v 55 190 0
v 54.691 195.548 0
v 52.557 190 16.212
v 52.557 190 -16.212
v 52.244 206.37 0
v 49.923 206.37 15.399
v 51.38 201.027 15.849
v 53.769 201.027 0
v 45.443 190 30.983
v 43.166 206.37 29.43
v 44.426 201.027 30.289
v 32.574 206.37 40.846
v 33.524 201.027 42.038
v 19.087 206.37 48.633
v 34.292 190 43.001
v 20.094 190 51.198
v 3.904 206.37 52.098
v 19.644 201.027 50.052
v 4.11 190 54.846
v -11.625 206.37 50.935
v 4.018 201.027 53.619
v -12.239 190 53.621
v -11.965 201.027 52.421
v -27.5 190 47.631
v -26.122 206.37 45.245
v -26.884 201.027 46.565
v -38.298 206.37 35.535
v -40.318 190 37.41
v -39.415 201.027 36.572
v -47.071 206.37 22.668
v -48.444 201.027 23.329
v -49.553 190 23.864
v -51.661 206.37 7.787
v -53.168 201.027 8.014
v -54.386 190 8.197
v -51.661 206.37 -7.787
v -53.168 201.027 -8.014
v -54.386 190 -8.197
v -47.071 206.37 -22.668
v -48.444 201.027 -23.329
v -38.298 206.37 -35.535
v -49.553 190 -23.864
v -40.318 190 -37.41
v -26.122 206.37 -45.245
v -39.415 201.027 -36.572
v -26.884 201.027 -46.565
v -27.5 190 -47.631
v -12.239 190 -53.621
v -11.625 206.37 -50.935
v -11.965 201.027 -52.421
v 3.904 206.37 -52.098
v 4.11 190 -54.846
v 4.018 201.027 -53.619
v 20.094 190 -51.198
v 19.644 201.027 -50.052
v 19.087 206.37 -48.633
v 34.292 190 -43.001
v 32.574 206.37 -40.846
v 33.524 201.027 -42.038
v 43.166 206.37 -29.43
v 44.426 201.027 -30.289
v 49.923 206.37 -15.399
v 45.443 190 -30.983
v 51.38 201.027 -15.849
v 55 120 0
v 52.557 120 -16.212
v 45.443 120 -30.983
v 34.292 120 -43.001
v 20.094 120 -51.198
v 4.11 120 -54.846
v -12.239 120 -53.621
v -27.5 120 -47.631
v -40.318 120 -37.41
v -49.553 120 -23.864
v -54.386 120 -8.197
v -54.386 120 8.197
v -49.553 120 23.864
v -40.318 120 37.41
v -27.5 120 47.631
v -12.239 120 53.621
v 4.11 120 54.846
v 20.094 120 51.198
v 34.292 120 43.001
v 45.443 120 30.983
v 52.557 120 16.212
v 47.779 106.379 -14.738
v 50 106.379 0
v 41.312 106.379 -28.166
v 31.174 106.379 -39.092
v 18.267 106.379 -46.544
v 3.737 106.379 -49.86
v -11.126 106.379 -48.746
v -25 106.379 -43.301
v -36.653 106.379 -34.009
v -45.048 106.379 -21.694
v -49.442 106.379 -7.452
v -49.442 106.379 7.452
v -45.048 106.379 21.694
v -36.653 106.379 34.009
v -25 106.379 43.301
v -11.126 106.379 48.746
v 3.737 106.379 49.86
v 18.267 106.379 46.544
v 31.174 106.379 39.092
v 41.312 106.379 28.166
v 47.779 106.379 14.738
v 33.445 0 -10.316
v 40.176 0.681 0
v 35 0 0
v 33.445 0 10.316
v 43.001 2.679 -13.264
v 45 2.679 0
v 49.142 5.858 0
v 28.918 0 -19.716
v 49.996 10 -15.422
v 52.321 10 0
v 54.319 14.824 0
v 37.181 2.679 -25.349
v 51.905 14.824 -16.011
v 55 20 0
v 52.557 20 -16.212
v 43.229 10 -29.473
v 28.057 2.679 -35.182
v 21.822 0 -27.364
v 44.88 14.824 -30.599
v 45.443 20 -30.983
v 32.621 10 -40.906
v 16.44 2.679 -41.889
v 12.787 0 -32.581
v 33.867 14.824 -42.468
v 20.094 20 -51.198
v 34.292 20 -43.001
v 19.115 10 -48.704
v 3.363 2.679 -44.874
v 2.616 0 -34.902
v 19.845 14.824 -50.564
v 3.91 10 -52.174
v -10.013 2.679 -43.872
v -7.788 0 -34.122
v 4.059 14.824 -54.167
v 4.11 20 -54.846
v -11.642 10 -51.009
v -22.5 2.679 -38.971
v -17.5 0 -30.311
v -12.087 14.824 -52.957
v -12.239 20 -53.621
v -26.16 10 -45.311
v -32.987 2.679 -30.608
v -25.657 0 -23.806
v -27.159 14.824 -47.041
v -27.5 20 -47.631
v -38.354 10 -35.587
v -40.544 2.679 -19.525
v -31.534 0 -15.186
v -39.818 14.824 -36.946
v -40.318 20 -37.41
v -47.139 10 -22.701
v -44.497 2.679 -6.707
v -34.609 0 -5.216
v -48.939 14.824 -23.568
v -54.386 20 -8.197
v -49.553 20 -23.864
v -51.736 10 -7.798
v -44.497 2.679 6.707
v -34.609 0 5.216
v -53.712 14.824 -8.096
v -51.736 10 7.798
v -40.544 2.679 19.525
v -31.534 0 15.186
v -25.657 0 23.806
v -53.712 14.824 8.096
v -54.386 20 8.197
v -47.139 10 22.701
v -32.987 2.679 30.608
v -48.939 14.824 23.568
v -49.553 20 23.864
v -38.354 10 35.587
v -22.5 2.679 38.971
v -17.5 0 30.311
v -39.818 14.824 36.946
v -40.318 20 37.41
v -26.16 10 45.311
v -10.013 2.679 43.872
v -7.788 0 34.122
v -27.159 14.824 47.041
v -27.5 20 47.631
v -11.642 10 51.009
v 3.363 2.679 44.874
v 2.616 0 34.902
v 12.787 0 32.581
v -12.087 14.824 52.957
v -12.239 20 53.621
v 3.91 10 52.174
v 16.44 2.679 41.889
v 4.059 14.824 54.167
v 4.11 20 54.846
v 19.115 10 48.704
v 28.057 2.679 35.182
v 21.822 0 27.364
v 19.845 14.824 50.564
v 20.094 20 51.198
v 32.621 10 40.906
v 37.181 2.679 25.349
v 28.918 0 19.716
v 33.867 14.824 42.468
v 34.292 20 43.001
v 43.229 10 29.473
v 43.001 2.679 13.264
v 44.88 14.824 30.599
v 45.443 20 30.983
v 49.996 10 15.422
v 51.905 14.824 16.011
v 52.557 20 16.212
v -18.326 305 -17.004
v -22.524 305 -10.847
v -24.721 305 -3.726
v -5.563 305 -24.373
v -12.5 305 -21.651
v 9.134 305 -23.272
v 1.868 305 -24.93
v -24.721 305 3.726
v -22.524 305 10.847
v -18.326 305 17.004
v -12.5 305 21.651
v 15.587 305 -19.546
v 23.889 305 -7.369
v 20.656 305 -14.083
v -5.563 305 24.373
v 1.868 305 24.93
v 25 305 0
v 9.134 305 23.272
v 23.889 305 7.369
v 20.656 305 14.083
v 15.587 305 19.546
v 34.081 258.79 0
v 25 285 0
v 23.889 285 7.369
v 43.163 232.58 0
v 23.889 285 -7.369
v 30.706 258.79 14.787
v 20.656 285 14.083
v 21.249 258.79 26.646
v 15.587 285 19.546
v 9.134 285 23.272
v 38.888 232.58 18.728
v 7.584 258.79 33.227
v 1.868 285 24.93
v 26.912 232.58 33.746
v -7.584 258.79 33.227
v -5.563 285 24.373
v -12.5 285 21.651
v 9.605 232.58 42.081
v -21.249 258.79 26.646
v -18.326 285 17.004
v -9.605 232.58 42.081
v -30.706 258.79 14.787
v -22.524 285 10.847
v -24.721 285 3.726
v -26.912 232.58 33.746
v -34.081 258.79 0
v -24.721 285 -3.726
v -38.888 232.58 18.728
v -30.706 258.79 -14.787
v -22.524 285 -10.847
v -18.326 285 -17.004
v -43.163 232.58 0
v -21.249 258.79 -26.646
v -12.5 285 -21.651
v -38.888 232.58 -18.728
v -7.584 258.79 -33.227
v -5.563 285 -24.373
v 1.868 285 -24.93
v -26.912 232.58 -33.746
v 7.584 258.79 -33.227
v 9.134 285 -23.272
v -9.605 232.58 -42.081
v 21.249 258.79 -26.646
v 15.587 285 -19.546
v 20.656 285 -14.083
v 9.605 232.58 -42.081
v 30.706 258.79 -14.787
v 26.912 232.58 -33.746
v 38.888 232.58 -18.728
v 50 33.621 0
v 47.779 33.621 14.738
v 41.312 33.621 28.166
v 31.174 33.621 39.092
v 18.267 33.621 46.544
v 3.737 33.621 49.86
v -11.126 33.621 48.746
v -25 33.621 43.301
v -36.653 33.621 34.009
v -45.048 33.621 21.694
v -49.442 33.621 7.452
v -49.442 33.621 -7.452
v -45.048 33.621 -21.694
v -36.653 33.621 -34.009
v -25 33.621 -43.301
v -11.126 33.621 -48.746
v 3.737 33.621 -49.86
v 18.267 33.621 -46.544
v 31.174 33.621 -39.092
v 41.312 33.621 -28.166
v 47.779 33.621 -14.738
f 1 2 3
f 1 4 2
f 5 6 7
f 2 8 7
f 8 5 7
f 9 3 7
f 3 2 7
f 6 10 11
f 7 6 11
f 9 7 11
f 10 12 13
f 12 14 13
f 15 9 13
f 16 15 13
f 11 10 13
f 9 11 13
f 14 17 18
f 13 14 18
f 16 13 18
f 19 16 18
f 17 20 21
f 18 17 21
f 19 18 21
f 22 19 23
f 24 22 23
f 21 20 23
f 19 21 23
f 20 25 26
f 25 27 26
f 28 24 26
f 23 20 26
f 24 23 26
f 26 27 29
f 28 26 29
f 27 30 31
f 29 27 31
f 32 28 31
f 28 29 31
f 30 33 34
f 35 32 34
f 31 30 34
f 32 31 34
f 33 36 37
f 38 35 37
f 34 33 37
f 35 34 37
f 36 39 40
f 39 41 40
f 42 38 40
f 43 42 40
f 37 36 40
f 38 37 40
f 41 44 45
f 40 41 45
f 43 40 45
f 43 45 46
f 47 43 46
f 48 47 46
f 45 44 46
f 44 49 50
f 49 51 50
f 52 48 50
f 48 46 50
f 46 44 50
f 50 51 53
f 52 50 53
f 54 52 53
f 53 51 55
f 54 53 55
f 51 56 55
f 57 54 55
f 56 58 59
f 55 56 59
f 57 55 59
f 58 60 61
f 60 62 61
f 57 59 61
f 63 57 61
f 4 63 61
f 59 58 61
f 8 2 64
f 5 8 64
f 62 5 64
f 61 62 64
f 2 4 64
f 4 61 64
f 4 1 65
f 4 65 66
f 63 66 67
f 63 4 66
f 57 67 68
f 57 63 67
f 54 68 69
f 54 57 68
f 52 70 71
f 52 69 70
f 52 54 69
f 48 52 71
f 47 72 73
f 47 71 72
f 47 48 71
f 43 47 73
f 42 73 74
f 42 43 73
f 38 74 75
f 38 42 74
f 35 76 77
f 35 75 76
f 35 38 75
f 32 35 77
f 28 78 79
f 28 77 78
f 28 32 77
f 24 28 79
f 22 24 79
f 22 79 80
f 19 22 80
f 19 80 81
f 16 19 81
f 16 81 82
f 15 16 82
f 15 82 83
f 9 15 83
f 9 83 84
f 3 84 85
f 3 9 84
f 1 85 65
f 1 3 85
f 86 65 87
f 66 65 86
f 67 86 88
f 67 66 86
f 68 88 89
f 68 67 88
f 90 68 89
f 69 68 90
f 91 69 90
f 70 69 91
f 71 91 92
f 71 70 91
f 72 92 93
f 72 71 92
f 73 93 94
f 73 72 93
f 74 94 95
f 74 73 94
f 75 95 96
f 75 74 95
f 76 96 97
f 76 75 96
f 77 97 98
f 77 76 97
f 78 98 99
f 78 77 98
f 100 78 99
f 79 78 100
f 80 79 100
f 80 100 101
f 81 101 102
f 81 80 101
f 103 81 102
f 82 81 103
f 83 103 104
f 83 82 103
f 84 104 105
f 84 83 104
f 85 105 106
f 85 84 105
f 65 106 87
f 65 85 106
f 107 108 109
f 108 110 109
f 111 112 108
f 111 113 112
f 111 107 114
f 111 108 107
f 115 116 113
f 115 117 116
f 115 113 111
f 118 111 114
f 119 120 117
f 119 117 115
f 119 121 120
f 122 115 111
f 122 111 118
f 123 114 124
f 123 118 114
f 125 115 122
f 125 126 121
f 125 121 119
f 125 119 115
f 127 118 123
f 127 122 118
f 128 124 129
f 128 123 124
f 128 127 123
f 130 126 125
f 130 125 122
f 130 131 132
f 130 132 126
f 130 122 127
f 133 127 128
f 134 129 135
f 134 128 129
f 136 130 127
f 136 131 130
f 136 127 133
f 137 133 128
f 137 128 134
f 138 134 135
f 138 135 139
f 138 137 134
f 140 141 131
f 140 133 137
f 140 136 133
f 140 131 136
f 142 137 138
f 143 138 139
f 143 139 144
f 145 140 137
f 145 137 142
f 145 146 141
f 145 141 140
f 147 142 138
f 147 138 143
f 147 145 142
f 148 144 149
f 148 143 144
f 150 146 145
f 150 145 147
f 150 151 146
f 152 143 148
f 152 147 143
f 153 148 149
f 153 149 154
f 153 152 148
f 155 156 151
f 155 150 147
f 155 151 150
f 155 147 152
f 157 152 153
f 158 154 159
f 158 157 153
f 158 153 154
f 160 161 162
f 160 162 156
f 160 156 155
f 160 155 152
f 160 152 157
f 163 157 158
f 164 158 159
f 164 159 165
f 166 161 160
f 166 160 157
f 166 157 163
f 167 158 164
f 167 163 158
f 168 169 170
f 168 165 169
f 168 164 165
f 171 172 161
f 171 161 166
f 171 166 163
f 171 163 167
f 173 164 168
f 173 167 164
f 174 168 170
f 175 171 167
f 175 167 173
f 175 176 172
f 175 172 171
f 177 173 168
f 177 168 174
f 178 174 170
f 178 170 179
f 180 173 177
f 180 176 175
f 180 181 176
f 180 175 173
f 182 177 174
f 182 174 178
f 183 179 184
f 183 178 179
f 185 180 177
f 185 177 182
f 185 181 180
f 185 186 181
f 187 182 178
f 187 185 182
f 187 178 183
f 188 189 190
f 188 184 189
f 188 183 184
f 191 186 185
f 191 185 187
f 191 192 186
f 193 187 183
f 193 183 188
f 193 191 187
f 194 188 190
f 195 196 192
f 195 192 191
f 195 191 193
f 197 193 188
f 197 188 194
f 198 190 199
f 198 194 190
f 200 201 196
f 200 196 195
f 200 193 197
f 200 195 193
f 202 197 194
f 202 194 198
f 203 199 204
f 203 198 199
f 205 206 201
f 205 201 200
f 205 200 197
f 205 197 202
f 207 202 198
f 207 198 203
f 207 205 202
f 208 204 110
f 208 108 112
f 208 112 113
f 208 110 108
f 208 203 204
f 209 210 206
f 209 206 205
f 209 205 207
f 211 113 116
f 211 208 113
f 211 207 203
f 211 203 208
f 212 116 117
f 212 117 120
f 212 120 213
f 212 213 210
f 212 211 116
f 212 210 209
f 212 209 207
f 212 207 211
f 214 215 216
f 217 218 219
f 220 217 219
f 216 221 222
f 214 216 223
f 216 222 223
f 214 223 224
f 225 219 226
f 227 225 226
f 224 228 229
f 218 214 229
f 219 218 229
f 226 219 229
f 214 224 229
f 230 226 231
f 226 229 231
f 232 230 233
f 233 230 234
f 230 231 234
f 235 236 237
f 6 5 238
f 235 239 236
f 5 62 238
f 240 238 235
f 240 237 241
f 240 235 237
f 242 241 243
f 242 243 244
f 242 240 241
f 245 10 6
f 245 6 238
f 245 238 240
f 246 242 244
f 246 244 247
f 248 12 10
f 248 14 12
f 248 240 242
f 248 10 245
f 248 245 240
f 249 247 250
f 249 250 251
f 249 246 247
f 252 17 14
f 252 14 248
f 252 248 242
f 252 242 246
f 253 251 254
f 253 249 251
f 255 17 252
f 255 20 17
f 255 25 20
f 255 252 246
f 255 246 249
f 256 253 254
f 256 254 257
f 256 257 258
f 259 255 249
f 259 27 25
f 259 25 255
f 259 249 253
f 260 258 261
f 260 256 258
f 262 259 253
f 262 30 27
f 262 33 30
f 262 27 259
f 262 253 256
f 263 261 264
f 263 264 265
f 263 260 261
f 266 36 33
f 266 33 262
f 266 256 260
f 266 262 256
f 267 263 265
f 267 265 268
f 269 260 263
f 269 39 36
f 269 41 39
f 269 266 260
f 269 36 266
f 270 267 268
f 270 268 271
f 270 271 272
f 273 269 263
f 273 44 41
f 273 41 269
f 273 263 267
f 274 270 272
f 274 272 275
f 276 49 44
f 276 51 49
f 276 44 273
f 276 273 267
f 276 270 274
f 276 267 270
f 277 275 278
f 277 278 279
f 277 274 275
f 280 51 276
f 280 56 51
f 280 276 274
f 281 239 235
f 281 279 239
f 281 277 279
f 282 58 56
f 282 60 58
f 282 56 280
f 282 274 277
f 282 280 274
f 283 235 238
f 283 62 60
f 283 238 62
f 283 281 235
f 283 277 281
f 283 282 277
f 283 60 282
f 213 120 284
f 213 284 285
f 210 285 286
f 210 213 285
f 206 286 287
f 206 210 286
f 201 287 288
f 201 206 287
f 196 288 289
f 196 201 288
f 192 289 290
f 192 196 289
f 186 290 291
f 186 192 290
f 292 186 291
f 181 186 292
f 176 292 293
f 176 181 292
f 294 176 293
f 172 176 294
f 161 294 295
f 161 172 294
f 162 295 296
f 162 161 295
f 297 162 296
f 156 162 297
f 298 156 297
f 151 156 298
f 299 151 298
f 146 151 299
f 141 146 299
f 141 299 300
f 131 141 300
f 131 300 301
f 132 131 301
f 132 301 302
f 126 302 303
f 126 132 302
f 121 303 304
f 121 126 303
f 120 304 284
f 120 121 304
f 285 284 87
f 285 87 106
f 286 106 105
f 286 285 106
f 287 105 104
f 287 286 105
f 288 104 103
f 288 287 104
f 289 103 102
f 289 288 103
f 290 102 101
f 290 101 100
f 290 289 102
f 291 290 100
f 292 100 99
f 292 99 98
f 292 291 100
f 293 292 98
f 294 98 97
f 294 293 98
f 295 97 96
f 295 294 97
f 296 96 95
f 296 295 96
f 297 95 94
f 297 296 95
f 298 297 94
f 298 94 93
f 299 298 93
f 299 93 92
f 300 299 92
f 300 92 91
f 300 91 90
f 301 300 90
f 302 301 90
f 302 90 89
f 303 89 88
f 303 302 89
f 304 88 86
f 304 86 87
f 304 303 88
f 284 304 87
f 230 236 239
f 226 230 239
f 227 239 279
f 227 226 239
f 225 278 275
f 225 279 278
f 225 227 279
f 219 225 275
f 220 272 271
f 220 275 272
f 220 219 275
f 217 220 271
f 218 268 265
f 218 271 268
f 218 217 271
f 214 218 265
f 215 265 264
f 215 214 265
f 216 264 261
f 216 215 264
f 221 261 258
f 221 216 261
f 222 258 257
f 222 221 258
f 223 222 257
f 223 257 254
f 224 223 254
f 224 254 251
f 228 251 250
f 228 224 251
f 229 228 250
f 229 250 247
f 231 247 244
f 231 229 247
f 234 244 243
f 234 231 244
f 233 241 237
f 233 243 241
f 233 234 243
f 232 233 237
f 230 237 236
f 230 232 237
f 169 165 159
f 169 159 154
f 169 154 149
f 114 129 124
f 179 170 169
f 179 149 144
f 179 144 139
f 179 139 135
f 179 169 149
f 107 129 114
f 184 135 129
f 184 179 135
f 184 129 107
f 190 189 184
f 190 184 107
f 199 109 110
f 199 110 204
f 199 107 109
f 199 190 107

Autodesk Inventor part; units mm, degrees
ref_plane "YZ Plane" through (0, 0, 0) normal (1, 0, 0) x (0, 1, 0)
ref_plane "XZ Plane" through (0, 0, 0) normal (0, 1, 0) x (-1, 0, 0)
ref_plane "XY Plane" through (0, 0, 0) normal (0, 0, 1) x (1, 0, 0)
sketch "Sketch1" plane through (0, 0, 0) normal (0, 0, 1) x (1, 0, 0)
  line L0 (0, 0) -> (35, 0)
  line L1 (55, 20) -> (55, 120) construction
  line L2 (52.2444, 206.3696) -> (25, 285)
  line L3 (25, 285) -> (25, 305)
  line L4 (25, 305) -> (0, 305)
  line L5 (0, 305) -> (0, 0)
  arc A0 (55, 190) -> (52.2444, 206.3696) centre (5, 190) ccw
  arc A1 (35, 0) -> (55, 20) centre (35, 20) ccw
  line L6 (55, 120) -> (50, 106.3786)
  line L7 (50, 106.3786) -> (50, 33.6214)
  line L8 (50, 33.6214) -> (55, 20)
  line L9 (55, 120) -> (55, 190)
  point P0 (55, 0)
  dimension "d1" = 55
  dimension "d4" = 50
  dimension "d6" = 25
  dimension "d7" = 20
  dimension "d8" = 115
  dimension "d9" = 20
  dimension "d10" = 70
  dimension "d11" = 120
  dimension "d12" = 5
revolve "Revolution1" add sketch "Sketch1" angle 360 about axis through (0, 305, 0) along (0, -1, 0)
properties part number "2L bottle"
